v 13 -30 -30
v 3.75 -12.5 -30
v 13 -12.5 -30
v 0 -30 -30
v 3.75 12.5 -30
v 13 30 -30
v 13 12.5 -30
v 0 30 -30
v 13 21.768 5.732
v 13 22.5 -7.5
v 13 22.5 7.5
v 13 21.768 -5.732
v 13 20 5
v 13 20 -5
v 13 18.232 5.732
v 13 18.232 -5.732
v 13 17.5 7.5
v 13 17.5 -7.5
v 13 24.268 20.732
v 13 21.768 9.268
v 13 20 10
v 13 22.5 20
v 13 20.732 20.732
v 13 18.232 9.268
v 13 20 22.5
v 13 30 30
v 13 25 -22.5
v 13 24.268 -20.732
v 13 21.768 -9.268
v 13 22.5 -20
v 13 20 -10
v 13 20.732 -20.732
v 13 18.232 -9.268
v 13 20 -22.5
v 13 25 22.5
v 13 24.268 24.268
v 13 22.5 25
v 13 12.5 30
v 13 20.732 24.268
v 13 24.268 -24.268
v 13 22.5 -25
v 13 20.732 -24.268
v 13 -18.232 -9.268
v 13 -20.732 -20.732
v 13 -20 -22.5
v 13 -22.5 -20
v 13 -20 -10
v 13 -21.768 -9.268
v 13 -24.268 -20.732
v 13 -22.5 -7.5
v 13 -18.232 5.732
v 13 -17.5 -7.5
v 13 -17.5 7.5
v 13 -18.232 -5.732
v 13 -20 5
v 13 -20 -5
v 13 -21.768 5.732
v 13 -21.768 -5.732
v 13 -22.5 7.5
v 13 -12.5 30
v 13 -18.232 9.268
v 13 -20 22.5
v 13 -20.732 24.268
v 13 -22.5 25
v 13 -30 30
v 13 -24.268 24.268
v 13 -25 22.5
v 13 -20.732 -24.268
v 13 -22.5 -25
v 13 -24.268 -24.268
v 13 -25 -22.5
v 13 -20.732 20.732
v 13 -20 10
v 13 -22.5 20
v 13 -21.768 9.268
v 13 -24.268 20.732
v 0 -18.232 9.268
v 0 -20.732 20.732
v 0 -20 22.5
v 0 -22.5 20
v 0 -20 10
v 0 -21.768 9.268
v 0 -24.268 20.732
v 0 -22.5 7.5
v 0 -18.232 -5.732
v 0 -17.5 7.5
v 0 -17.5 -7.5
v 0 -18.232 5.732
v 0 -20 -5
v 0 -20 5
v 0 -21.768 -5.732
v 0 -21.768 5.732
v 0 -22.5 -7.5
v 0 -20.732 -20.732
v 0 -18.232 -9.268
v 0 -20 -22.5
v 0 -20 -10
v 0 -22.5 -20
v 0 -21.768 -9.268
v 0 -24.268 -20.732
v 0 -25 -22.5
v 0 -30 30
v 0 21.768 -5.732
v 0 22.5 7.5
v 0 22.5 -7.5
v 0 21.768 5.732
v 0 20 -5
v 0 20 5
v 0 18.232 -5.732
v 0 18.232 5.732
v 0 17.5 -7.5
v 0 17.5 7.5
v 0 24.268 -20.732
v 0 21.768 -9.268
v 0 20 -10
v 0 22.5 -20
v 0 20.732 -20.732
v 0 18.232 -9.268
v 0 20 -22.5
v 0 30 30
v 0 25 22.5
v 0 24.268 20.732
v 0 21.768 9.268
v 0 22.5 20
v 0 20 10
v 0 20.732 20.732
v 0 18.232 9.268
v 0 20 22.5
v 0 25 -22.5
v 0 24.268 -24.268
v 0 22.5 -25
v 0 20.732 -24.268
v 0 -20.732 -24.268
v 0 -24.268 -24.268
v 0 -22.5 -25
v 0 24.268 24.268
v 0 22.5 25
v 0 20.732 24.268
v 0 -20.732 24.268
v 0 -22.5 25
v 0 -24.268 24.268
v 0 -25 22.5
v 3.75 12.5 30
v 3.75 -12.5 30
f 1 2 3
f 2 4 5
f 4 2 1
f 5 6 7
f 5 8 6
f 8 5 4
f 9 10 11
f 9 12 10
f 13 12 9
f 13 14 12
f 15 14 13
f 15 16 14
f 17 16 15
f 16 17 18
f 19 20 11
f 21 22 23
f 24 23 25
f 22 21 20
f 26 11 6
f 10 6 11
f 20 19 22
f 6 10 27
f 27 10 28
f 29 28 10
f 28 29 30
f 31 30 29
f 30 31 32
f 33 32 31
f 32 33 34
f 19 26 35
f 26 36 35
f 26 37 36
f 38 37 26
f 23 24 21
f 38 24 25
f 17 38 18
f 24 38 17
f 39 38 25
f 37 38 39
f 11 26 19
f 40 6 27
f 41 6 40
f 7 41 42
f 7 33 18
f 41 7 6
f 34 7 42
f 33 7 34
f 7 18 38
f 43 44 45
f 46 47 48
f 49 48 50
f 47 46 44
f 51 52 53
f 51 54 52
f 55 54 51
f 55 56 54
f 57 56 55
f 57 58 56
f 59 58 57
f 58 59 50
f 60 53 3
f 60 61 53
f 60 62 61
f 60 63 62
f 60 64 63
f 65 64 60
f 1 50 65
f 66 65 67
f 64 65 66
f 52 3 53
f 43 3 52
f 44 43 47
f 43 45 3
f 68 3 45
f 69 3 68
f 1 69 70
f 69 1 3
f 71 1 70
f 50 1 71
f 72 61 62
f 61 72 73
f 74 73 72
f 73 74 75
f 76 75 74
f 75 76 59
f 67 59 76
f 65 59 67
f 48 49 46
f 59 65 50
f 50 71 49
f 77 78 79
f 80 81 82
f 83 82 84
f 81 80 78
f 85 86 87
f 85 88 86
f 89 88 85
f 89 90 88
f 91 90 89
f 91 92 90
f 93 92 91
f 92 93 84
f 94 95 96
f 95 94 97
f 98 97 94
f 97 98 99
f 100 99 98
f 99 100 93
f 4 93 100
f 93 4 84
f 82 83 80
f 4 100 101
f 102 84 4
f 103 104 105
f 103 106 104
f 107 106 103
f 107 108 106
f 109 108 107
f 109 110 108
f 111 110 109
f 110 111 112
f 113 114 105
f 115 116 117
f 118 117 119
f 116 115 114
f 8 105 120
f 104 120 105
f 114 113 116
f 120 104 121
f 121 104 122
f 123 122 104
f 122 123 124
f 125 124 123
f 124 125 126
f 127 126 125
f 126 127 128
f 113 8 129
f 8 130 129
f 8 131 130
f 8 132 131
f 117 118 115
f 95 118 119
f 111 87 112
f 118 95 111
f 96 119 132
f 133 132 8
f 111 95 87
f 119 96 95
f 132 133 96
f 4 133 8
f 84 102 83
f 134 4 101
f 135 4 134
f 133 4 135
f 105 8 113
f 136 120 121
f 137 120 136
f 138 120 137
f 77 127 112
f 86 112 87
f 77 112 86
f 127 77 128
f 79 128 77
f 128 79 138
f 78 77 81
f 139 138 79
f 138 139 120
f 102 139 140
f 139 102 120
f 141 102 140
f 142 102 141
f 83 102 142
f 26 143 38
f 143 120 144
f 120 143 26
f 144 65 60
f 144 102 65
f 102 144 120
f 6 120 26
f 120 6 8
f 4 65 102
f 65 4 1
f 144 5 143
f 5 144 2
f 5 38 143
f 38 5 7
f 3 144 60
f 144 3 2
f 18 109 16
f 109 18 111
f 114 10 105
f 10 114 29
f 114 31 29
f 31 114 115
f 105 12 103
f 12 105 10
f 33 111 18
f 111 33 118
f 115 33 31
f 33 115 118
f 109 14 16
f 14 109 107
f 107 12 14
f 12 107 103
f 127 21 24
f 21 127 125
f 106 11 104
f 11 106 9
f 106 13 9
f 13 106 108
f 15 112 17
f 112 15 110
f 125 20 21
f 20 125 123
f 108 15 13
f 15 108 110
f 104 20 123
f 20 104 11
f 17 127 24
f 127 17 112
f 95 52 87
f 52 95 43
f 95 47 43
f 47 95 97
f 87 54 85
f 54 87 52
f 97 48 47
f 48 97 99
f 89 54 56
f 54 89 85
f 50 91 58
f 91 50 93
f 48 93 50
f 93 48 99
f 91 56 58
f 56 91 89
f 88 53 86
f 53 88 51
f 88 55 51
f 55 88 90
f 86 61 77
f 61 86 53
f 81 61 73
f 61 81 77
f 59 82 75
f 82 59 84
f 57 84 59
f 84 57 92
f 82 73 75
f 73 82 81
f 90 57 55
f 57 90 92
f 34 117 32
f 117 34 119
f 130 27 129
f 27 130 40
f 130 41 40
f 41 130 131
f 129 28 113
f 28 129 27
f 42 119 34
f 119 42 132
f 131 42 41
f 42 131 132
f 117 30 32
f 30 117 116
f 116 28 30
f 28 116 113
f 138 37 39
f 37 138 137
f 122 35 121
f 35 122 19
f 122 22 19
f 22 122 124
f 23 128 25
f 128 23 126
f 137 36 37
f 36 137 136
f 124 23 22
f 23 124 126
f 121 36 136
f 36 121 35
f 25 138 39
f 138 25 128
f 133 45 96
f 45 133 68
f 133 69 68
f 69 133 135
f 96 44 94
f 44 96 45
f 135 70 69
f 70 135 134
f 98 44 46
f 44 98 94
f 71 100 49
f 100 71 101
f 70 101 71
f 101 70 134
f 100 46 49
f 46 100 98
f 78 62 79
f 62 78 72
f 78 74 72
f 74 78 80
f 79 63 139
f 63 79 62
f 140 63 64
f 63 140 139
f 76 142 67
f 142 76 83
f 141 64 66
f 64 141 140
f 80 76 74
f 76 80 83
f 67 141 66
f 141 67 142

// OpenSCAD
// Gen1_delta MotorMount clamp
//block shape
x=60;
y=60;
z=13;

// track channel
f=x+10;
g=25;
h=9.5;
// block top
e=20;
r=y+10;
t=16.5;

// spacing of screw holes
cx=15;
cy=40;
dx=15;
dy=45;
cz=20;

//anglefloat
dk=25.5;
ck=21;

// rotation
gx=90;

rotate([0,gx,0])
difference()
{
    translate([0,0,z]/2) cube ([x,y,z],center=true);
    translate([0,0,z+4]/2) cube([f,g,h],center=true);
 
  translate([cx,cy,0]/2) cylinder(d=5, h=50,  center=true);
  translate([-cx,cy,0]/2) cylinder(d=5, h=50,  center=true);
    translate([cx,-cy,0]/2) cylinder(d=5, h=50,  center=true);
    translate([-cx,-cy,0]/2) cylinder(d=5, h=50,  center=true);
 //corner holes
    translate([dy,dy,0]/2) cylinder(d=5, h=50,  center=true);
  translate([-dy,dy,0]/2) cylinder(d=5, h=50,  center=true);
    translate([dy,-dy,0]/2) cylinder(d=5, h=50,  center=true);
    translate([-dy,-dy,0]/2) cylinder(d=5, h=50,  center=true);  
 //   translate([dy,dx,0]/2) cylinder(d=5, h=50,  center=true);
 // translate([-dy,dx,0]/2) cylinder(d=5, h=50,  center=true);  
//  translate([dy,-dx,0]/2) cylinder(d=5, h=50,  center=true);
 // translate([-dy,-dx,0]/2) cylinder(d=5, h=50,  center=true);  
    
// translate([cx,cy,0]/2)  cylinder(d1=16, d2=8, h=7,  center=true);
// translate([-cx,cy,0]/2) cylinder(d1=16, d2=8, h=7, center=true);
 //   translate([cx,-cy,0]/2) cylinder(d1=16, d2=8, h=7,  center=true);
  //  translate([-cx,-cy,0]/2) cylinder(d1=16, d2=8, h=7,  center=true);    
// zip tie knotches    
 //   translate([0,-cy/2,11.5-10]) cube([18,3,4],center=true);
  //  translate([0,cy/2,11.5-10]) cube([18,3,4],center=true);
// removal knotches
//       translate([0,-(6.8+51)/2,11.5]) cube([8,3,4],center=true);
//   translate([0,(6.8+51)/2,11.5-10]) cube([8,3,4],center=true);
//   translate([(6.8+51)/2,0,11.5-11]) cube([3,8,2],center=true);
  // translate([-(6.8+51)/2,0,11.5-11]) cube([3,8,2],center=true);
}
